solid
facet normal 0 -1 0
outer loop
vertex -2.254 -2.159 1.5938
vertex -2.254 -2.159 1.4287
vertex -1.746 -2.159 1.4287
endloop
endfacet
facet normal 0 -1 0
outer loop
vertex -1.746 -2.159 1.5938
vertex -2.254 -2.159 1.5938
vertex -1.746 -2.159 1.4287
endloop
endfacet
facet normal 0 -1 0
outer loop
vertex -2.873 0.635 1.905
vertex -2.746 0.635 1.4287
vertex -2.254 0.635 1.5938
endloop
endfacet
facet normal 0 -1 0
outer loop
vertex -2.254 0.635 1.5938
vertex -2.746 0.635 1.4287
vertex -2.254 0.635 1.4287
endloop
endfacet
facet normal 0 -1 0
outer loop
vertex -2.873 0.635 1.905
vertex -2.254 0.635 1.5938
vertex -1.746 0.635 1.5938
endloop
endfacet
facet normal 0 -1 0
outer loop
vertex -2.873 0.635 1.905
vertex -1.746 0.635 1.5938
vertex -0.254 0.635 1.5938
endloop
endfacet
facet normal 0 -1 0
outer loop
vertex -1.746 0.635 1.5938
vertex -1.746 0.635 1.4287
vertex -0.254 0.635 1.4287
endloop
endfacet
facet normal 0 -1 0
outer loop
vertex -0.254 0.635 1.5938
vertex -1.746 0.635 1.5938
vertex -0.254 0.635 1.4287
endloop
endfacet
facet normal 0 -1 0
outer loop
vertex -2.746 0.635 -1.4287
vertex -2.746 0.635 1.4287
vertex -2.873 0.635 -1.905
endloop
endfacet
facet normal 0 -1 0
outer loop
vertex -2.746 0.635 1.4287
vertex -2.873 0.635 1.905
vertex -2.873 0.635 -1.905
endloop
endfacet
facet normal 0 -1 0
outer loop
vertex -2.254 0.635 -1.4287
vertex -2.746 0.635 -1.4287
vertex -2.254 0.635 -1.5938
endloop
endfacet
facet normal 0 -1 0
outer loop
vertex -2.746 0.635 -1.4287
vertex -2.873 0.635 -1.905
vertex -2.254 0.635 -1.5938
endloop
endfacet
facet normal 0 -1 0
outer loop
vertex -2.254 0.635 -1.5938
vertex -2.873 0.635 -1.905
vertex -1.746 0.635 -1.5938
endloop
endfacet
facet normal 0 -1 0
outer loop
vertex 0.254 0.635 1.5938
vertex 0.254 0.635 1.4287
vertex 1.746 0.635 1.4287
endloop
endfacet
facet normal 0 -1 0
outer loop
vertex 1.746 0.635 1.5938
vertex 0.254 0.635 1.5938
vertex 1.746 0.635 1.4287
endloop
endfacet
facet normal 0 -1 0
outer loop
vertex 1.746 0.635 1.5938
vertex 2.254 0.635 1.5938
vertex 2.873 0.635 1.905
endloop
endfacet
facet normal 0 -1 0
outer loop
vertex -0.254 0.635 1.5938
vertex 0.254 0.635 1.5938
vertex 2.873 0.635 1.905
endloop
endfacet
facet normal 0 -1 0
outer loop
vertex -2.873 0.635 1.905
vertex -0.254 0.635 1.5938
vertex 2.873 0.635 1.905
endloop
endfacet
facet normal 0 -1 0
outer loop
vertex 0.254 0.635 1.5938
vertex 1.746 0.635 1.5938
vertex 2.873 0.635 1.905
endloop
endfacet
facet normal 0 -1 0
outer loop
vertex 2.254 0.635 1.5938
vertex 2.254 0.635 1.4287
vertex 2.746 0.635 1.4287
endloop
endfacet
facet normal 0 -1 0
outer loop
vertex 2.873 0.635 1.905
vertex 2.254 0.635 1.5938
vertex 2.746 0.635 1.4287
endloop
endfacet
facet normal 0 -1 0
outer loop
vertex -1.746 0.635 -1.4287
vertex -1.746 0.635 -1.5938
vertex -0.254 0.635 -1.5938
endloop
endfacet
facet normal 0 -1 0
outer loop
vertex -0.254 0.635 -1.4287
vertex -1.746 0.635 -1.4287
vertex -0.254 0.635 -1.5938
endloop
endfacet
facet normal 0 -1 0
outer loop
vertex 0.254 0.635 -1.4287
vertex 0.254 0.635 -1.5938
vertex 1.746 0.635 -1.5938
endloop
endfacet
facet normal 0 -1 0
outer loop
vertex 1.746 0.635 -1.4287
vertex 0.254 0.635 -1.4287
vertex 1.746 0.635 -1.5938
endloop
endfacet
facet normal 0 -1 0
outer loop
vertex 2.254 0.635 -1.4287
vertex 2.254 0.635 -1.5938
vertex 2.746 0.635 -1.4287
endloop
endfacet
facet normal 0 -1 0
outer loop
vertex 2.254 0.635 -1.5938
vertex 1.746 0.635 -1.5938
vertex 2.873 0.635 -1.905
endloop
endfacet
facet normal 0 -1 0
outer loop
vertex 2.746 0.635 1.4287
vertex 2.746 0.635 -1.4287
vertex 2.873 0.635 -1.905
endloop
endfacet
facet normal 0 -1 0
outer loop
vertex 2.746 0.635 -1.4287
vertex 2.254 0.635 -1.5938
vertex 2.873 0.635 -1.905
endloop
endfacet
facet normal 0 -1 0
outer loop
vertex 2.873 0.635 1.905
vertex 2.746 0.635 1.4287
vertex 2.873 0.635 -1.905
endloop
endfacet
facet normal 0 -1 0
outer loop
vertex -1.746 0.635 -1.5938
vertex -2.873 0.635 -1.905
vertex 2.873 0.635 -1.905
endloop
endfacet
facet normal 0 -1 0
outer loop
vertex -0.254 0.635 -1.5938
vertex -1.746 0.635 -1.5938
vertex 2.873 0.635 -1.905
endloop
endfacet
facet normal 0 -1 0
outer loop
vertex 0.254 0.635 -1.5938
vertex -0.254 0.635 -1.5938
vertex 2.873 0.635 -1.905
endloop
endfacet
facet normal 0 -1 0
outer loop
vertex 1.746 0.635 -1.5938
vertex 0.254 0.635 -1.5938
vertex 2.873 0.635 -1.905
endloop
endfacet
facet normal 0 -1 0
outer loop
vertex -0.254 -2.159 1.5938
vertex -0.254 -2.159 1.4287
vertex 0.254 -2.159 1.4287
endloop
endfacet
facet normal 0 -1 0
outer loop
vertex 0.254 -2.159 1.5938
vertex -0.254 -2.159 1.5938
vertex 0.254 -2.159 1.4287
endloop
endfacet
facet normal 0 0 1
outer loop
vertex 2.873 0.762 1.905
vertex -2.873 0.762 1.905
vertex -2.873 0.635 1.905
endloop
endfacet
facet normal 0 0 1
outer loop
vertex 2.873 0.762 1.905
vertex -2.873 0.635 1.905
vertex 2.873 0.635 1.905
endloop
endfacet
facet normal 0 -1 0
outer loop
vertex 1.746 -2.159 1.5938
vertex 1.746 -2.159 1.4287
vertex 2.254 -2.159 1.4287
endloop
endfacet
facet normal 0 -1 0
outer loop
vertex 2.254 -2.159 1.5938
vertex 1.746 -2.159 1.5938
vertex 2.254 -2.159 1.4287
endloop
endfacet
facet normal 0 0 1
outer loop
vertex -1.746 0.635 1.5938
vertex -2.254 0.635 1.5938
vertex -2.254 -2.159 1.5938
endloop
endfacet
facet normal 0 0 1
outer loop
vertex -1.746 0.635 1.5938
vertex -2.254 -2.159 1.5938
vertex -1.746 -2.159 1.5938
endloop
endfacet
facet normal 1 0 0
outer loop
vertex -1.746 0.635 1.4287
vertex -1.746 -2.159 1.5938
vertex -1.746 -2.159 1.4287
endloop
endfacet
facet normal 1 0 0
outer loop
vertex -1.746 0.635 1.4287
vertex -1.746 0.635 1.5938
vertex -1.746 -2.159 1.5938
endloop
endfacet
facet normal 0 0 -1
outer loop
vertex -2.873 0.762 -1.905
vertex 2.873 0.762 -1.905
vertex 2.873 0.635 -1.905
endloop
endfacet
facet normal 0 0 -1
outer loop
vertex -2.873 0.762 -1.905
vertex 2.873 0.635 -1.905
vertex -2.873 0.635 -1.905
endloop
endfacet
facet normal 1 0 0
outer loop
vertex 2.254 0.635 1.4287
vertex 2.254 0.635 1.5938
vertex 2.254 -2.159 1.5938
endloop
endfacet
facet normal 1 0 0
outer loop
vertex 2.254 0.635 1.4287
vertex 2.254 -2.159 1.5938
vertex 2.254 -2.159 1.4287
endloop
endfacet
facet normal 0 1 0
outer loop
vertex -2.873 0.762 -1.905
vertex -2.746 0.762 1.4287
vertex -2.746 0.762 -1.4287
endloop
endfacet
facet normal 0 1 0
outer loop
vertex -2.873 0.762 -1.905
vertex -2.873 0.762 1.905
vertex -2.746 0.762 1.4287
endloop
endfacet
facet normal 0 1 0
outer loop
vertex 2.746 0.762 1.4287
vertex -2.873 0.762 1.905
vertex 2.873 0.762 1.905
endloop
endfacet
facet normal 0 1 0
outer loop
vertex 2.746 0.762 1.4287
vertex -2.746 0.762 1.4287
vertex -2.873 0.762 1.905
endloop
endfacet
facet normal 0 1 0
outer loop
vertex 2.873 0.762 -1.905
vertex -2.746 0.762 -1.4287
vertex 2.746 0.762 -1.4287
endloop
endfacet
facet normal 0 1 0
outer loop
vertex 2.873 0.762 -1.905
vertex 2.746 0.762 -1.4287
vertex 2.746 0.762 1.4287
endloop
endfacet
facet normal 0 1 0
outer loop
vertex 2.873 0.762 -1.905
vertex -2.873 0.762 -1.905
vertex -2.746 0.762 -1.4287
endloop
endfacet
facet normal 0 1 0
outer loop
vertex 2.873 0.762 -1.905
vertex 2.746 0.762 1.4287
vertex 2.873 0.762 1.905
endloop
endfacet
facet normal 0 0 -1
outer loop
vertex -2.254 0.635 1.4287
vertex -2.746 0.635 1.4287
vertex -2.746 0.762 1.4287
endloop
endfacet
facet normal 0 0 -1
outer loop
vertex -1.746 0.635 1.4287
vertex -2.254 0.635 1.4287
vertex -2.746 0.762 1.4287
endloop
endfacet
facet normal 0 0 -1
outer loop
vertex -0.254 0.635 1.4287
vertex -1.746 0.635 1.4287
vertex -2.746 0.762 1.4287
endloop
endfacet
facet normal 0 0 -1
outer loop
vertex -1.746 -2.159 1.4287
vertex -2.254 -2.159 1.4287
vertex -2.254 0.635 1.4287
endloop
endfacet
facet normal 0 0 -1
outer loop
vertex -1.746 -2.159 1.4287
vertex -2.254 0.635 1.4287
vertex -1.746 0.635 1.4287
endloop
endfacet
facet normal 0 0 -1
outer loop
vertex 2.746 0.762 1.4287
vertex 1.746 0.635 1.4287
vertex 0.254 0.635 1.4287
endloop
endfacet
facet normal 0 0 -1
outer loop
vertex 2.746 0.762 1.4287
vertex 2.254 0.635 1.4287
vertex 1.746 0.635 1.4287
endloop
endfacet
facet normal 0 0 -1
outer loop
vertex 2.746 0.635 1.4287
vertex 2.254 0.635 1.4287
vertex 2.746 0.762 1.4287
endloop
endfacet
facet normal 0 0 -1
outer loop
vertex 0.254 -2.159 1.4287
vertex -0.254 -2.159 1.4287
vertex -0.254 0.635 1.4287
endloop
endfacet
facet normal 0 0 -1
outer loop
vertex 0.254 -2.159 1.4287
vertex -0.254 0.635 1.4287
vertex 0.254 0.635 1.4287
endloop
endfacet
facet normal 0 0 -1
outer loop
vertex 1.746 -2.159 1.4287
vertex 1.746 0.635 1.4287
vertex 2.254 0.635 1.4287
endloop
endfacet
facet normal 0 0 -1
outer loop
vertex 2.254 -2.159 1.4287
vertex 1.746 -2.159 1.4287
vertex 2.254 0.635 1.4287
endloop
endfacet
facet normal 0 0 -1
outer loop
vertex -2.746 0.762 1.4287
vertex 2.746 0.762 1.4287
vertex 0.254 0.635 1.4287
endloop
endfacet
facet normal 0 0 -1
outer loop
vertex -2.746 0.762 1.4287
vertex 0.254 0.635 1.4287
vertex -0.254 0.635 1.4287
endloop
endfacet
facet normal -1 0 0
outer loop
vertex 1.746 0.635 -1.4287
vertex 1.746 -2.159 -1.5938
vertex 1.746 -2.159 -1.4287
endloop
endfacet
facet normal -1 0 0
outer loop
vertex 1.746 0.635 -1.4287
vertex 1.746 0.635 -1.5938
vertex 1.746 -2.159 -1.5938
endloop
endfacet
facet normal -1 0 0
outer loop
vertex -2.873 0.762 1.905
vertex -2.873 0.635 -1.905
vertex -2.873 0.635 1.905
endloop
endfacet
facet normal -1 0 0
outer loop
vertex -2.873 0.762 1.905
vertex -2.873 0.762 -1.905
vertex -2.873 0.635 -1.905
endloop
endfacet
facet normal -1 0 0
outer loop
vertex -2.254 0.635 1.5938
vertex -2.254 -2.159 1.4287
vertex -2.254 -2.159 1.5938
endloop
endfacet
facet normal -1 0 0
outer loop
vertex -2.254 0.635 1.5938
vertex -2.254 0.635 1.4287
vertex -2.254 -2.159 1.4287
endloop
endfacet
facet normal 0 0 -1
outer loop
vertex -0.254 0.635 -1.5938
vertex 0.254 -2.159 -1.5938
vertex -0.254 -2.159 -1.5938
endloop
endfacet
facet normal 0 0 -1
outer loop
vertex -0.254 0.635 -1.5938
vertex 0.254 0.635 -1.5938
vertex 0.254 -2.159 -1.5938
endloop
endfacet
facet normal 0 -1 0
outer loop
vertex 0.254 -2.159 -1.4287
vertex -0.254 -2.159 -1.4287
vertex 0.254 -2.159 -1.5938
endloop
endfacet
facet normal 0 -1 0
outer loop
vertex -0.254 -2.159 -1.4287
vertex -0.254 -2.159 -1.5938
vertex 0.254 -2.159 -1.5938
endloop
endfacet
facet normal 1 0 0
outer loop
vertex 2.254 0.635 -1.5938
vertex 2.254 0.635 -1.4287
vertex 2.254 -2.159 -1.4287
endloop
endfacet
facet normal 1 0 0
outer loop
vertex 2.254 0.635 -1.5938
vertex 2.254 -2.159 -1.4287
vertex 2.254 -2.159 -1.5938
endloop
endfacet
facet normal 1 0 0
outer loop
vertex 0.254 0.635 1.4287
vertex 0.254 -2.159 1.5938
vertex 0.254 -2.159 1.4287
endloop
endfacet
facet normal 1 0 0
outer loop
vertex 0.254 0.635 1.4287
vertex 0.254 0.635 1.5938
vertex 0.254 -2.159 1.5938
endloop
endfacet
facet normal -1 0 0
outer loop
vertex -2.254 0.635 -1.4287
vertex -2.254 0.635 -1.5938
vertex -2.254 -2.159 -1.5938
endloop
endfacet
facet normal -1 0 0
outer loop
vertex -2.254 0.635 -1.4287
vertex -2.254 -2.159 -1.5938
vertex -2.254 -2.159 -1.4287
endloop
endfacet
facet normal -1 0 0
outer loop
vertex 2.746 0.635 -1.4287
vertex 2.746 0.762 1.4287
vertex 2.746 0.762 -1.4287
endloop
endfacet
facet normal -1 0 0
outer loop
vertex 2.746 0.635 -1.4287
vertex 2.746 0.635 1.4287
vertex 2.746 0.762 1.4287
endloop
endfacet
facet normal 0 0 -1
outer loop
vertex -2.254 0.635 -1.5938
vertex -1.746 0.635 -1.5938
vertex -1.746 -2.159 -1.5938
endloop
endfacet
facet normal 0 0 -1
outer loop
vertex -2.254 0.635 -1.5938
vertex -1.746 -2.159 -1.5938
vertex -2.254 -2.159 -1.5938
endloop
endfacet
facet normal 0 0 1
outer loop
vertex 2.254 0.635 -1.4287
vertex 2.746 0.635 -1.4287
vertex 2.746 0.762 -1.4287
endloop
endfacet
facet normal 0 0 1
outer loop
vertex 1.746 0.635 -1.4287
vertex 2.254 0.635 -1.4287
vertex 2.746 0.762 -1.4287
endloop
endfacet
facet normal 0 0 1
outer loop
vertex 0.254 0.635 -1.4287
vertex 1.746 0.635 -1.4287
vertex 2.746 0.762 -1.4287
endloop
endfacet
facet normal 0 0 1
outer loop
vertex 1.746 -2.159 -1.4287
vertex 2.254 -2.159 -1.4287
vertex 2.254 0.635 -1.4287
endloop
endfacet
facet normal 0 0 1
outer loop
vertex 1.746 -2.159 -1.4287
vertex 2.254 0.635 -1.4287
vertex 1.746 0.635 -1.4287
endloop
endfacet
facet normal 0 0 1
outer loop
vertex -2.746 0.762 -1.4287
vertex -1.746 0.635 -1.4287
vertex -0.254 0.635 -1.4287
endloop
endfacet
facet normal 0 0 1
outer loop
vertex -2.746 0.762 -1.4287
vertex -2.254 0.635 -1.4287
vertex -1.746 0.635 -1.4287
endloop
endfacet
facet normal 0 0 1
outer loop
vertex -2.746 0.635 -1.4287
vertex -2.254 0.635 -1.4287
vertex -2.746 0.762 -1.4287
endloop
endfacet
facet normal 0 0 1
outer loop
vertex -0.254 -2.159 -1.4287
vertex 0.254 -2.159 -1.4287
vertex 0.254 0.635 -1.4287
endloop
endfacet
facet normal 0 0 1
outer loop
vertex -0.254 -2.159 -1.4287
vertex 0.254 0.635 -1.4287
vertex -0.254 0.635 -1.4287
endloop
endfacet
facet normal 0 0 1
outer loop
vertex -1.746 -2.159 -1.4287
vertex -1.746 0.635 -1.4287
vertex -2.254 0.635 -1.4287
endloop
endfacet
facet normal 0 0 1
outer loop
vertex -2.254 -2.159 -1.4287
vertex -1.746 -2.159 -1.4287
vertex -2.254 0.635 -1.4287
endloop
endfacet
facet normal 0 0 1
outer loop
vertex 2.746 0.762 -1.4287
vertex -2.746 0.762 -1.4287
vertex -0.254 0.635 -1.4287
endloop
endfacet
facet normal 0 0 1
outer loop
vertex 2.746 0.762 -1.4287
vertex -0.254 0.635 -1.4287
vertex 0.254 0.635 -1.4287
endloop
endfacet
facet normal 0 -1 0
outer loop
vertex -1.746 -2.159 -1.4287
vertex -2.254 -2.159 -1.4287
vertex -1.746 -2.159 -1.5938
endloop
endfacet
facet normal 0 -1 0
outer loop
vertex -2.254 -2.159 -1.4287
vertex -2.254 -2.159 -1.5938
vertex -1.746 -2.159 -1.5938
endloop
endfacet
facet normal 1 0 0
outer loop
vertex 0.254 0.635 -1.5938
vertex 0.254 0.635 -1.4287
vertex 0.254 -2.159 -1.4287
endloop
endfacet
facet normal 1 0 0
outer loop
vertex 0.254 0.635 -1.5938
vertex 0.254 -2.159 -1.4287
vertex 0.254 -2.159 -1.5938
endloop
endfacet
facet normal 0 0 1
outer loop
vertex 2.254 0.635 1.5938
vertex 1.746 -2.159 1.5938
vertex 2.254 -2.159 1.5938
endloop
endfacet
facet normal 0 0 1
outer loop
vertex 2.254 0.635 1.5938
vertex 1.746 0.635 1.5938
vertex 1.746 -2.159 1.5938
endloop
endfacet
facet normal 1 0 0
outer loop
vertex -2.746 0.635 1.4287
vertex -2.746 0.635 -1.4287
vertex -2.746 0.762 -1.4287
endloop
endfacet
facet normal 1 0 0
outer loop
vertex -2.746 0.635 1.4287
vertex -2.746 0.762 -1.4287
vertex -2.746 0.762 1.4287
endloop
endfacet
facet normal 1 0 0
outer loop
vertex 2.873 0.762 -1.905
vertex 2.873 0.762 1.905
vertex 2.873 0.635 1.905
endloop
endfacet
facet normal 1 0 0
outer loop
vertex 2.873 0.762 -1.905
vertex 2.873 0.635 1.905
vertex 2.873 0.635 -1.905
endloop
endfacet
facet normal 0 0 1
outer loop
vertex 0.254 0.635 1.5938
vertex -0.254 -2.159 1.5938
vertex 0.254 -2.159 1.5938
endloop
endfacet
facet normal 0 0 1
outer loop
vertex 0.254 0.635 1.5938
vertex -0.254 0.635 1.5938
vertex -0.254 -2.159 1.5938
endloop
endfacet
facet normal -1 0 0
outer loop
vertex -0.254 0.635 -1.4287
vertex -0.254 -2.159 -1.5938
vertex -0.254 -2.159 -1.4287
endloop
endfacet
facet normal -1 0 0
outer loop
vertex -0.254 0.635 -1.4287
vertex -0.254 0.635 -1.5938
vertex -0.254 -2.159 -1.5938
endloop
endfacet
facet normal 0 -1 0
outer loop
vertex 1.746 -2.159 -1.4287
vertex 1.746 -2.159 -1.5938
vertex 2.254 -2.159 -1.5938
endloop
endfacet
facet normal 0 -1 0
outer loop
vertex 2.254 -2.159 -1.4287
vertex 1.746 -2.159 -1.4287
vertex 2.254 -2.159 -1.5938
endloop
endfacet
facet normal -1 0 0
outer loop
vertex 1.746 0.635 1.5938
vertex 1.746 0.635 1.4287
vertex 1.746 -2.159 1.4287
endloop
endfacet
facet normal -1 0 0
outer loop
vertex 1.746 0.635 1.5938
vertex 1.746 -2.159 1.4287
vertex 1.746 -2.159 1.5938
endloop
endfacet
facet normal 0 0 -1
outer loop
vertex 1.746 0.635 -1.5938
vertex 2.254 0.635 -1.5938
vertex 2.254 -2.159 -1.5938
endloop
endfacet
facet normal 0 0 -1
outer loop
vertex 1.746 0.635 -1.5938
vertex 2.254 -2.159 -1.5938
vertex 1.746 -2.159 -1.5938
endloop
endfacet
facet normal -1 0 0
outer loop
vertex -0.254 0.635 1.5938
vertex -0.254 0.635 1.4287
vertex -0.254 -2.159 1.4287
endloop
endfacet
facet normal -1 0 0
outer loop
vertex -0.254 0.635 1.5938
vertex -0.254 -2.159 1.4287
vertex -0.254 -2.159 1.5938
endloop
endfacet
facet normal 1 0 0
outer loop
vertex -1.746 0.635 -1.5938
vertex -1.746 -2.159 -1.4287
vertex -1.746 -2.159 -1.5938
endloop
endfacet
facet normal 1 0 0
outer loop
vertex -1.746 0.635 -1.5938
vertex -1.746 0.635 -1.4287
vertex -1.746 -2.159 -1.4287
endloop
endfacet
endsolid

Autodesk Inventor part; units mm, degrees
sketch "Sketch_3" plane through (0, 0.762, 0) normal (0, 1, 0) x (1, 0, 0)
  line L0 (-2.873, 1.905) -> (-2.873, -1.905)
  line L1 (-2.873, -1.905) -> (2.873, -1.905)
  line L2 (2.873, -1.905) -> (2.873, 1.905)
  line L3 (2.873, 1.905) -> (-2.873, 1.905)
extrude "Extrusion1" add sketch "Sketch_3" against normal blind 2.921
sketch "Sketch_4" plane through (0, 0.635, 0) normal (0, 1, 0) x (1, 0, 0)
  line L0 (-3, 2.54) -> (-3, -2.54)
  line L1 (-3, -2.54) -> (3, -2.54)
  line L2 (3, -2.54) -> (3, 2.54)
  line L3 (3, 2.54) -> (-3, 2.54)
  line L4 (1.746, -1.4287) -> (1.746, -1.5938)
  line L5 (1.746, -1.5938) -> (2.254, -1.5938)
  line L6 (2.254, -1.5938) -> (2.254, -1.4287)
  line L7 (2.254, -1.4287) -> (1.746, -1.4287)
  line L8 (1.746, 1.5938) -> (1.746, 1.4287)
  line L9 (1.746, 1.4287) -> (2.254, 1.4287)
  line L10 (2.254, 1.4287) -> (2.254, 1.5938)
  line L11 (2.254, 1.5938) -> (1.746, 1.5938)
  line L12 (-0.254, -1.4287) -> (-0.254, -1.5938)
  line L13 (-0.254, -1.5938) -> (0.254, -1.5938)
  line L14 (0.254, -1.5938) -> (0.254, -1.4287)
  line L15 (0.254, -1.4287) -> (-0.254, -1.4287)
  line L16 (-0.254, 1.5938) -> (-0.254, 1.4287)
  line L17 (-0.254, 1.4287) -> (0.254, 1.4287)
  line L18 (0.254, 1.4287) -> (0.254, 1.5938)
  line L19 (0.254, 1.5938) -> (-0.254, 1.5938)
  line L20 (-2.254, -1.4287) -> (-2.254, -1.5938)
  line L21 (-2.254, -1.5938) -> (-1.746, -1.5938)
  line L22 (-1.746, -1.5938) -> (-1.746, -1.4287)
  line L23 (-1.746, -1.4287) -> (-2.254, -1.4287)
  line L24 (-2.254, 1.5938) -> (-2.254, 1.4287)
  line L25 (-2.254, 1.4287) -> (-1.746, 1.4287)
  line L26 (-1.746, 1.4287) -> (-1.746, 1.5938)
  line L27 (-1.746, 1.5938) -> (-2.254, 1.5938)
extrude "Extrusion2" cut sketch "Sketch_4" against normal blind 2.921
sketch "Sketch_5" plane through (0, 0, 0) normal (0, 1, 0) x (-1, 0, 0)
  line L0 (2.746, -1.4287) -> (2.746, 1.4287)
  line L1 (2.746, 1.4287) -> (-2.746, 1.4287)
  line L2 (-2.746, 1.4287) -> (-2.746, -1.4287)
  line L3 (-2.746, -1.4287) -> (2.746, -1.4287)
extrude "Extrusion3" cut sketch "Sketch_5" along normal blind 2.159
ref_plane "pins_XY" through (0, 0, 0) normal (0, 1, 0) x (1, 0, 0)
ref_plane "pins_YZ" through (0, 0, 0) normal (1, 0, 0) x (0, 0, -1)
ref_plane "pins_ZX" through (0, 0, 0) normal (0, 0, -1) x (0, 1, 0)
properties part number "C-0301_pins"
